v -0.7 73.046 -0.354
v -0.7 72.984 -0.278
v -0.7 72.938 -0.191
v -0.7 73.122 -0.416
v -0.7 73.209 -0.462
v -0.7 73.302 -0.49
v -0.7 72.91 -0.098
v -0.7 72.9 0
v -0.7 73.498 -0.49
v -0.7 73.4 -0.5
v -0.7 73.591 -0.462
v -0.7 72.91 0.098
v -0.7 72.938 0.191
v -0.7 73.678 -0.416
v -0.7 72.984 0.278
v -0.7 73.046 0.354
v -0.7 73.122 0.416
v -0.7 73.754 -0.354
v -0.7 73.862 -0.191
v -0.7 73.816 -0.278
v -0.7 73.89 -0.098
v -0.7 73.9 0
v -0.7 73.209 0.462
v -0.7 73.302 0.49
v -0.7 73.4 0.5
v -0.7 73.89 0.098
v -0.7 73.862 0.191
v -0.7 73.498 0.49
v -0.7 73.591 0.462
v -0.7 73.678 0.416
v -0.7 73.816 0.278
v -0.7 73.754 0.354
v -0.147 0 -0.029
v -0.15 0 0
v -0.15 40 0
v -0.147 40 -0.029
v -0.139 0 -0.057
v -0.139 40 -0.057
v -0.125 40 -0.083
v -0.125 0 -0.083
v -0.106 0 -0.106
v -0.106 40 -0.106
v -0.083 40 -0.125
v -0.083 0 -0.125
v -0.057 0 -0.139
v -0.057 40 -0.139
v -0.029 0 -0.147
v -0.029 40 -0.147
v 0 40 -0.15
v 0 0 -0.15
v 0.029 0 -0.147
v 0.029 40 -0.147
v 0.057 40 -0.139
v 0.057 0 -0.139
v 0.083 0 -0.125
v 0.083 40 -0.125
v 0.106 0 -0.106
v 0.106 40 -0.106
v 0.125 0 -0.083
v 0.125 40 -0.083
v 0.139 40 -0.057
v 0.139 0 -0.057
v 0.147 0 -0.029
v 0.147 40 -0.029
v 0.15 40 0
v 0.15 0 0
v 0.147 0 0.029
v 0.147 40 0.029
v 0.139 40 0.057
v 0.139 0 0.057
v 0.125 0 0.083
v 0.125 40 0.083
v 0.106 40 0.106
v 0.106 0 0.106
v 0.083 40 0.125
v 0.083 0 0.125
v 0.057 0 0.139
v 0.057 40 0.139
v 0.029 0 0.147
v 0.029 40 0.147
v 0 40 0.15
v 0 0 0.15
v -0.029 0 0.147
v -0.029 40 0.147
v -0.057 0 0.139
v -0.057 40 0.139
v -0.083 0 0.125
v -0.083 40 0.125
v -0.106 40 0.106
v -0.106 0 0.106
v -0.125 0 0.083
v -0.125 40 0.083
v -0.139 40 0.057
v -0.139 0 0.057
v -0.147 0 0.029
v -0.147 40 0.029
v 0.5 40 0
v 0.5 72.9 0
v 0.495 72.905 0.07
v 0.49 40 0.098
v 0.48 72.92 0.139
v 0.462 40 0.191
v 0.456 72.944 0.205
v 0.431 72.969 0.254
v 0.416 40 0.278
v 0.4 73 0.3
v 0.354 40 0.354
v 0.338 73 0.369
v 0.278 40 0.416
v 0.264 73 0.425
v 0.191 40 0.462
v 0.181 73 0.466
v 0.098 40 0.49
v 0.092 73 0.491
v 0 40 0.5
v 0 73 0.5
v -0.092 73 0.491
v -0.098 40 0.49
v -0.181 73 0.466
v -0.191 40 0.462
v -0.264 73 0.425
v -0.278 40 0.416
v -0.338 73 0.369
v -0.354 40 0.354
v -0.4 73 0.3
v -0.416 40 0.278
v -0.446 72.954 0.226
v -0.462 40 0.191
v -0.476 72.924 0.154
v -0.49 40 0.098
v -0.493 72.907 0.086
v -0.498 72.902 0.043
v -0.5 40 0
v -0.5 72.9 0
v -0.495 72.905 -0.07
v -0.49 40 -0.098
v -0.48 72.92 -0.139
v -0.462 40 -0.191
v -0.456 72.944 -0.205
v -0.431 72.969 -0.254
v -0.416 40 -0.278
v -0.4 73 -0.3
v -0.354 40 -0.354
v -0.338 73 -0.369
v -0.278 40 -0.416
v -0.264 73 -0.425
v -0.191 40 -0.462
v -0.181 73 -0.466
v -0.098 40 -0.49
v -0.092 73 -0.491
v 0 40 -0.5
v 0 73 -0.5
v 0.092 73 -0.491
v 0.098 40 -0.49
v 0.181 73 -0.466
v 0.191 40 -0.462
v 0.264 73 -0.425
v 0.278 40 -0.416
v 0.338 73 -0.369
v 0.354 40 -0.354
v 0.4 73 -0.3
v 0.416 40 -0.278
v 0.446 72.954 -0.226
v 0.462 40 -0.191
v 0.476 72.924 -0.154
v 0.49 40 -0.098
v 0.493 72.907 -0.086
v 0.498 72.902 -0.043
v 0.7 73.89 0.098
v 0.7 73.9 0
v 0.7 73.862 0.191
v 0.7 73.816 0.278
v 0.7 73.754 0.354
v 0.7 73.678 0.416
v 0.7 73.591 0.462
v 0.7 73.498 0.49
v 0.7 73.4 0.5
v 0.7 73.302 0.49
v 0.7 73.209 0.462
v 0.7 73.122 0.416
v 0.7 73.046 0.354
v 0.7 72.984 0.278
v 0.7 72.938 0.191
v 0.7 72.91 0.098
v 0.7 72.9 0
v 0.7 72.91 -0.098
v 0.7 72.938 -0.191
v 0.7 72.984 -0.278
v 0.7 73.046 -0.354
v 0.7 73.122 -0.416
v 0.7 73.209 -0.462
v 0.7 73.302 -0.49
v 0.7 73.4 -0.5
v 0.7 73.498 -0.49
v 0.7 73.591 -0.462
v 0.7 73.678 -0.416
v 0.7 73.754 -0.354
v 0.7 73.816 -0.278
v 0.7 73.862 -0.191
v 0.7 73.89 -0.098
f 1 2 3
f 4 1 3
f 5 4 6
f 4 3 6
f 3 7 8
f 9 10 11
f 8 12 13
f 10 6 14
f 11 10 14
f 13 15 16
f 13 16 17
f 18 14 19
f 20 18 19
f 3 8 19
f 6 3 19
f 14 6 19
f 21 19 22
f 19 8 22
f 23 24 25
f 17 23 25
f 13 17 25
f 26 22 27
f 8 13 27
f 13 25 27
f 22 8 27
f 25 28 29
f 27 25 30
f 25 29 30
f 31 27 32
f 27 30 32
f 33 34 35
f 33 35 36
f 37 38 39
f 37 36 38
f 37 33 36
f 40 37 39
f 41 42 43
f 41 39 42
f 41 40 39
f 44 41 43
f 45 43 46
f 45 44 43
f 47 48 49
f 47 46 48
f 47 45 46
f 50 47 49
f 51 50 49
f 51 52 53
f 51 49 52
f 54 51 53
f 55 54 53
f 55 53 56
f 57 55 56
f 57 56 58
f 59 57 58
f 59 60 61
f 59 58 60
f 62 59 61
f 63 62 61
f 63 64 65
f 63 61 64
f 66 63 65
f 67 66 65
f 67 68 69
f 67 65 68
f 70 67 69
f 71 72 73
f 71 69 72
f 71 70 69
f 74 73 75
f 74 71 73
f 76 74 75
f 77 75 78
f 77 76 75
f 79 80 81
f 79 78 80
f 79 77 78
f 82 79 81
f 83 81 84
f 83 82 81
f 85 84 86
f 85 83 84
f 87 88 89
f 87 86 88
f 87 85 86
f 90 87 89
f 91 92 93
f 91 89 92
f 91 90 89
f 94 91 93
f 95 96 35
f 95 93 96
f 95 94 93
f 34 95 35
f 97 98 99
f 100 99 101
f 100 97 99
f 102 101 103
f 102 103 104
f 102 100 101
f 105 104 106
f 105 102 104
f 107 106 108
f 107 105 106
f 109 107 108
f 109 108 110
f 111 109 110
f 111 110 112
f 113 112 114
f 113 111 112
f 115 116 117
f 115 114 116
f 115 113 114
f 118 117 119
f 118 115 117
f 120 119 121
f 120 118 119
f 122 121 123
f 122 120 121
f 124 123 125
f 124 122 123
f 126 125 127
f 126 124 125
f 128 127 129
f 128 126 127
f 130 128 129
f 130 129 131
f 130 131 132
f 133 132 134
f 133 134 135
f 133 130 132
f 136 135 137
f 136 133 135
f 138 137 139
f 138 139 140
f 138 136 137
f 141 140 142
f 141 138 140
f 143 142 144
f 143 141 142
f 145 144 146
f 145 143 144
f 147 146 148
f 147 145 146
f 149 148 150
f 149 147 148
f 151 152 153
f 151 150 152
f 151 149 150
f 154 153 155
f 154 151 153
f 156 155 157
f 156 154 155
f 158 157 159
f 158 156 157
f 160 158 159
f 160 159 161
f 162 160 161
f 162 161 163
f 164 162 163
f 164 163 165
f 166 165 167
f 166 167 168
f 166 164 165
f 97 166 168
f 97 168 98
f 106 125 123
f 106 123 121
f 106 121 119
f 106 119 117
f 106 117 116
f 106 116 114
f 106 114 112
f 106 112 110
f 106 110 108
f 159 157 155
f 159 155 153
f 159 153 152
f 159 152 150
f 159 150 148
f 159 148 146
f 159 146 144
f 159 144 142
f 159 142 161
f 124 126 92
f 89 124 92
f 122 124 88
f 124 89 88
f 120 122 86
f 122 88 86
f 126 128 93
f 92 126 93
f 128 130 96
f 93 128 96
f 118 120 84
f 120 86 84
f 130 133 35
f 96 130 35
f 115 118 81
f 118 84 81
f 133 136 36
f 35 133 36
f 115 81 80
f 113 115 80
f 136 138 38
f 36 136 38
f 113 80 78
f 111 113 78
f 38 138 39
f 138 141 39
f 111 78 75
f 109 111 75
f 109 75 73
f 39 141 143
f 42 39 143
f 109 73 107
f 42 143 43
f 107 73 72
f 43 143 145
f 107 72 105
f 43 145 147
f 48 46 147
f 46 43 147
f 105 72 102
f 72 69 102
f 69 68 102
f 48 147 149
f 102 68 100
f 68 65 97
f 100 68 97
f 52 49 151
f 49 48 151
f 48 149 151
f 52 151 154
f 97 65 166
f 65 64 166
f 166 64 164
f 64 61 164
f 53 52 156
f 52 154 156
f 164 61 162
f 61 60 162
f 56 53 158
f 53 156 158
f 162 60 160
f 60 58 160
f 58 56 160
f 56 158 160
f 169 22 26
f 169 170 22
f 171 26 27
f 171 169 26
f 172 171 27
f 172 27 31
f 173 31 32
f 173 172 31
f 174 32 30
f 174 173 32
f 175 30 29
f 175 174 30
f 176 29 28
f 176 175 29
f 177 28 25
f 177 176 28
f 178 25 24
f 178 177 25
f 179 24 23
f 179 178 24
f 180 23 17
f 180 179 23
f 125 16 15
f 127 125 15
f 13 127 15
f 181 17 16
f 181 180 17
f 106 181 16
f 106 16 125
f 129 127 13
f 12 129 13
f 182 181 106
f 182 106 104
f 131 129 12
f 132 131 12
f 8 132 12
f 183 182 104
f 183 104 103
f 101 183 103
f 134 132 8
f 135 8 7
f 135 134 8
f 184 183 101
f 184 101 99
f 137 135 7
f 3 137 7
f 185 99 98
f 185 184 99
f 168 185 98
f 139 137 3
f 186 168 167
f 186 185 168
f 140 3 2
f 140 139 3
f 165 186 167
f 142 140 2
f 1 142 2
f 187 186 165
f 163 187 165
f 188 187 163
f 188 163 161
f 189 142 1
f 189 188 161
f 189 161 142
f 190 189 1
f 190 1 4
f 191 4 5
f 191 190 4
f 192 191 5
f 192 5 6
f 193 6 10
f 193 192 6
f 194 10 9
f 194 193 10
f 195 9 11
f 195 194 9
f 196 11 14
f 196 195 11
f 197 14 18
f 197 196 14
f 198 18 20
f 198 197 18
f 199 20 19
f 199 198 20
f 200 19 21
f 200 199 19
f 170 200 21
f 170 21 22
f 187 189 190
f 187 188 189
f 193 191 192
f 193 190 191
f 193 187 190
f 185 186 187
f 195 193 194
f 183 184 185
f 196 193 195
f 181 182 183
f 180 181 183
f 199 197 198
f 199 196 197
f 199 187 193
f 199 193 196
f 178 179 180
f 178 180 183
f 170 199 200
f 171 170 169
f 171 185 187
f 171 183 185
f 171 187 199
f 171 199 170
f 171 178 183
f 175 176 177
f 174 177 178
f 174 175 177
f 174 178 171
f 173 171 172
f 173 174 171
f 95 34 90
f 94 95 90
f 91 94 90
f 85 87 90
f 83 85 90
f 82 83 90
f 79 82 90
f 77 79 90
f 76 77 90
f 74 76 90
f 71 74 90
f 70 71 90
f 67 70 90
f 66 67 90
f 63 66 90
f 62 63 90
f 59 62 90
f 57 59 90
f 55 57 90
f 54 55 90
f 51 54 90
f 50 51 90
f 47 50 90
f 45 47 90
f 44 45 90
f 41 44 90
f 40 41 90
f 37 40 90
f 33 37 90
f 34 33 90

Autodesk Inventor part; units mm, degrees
ref_plane "YZ Plane" through (0, 0, 0) normal (1, 0, 0) x (0, 1, 0)
ref_plane "XZ Plane" through (0, 0, 0) normal (0, 1, 0) x (-1, 0, 0)
ref_plane "XY Plane" through (0, 0, 0) normal (0, 0, 1) x (1, 0, 0)
sketch "Sketch1" plane through (0, 0, 0) normal (0, 1, 0) x (-1, 0, 0)
  circle A0 centre (0, 0) radius 0.15
  dimension "d0" = 0.3
extrude "Extrusion1" add sketch "Sketch1" along normal blind 40
sketch "Sketch2" plane through (0, 40, 0) normal (0, 1, 0) x (1, 0, 0)
  circle A0 centre (0, 0) radius 0.5
  dimension "d3" = 1
extrude "Extrusion2" add sketch "Sketch2" along normal blind 33
sketch "Sketch3" plane through (0, 0, 0) normal (1, 0, 0) x (0, 1, 0)
  line L0 (73, -0.5) -> (73, 0.5) projected
  line L1 (73, 0) -> (73.4, 0)
  circle A0 centre (73.4, 0) radius 0.5
  point P0 (0, 0)
  dimension "d6" = 0.4
  dimension "d7" = 1
extrude "Extrusion3" add sketch "Sketch3" along normal mid plane 1.4
properties part number "neddle"
